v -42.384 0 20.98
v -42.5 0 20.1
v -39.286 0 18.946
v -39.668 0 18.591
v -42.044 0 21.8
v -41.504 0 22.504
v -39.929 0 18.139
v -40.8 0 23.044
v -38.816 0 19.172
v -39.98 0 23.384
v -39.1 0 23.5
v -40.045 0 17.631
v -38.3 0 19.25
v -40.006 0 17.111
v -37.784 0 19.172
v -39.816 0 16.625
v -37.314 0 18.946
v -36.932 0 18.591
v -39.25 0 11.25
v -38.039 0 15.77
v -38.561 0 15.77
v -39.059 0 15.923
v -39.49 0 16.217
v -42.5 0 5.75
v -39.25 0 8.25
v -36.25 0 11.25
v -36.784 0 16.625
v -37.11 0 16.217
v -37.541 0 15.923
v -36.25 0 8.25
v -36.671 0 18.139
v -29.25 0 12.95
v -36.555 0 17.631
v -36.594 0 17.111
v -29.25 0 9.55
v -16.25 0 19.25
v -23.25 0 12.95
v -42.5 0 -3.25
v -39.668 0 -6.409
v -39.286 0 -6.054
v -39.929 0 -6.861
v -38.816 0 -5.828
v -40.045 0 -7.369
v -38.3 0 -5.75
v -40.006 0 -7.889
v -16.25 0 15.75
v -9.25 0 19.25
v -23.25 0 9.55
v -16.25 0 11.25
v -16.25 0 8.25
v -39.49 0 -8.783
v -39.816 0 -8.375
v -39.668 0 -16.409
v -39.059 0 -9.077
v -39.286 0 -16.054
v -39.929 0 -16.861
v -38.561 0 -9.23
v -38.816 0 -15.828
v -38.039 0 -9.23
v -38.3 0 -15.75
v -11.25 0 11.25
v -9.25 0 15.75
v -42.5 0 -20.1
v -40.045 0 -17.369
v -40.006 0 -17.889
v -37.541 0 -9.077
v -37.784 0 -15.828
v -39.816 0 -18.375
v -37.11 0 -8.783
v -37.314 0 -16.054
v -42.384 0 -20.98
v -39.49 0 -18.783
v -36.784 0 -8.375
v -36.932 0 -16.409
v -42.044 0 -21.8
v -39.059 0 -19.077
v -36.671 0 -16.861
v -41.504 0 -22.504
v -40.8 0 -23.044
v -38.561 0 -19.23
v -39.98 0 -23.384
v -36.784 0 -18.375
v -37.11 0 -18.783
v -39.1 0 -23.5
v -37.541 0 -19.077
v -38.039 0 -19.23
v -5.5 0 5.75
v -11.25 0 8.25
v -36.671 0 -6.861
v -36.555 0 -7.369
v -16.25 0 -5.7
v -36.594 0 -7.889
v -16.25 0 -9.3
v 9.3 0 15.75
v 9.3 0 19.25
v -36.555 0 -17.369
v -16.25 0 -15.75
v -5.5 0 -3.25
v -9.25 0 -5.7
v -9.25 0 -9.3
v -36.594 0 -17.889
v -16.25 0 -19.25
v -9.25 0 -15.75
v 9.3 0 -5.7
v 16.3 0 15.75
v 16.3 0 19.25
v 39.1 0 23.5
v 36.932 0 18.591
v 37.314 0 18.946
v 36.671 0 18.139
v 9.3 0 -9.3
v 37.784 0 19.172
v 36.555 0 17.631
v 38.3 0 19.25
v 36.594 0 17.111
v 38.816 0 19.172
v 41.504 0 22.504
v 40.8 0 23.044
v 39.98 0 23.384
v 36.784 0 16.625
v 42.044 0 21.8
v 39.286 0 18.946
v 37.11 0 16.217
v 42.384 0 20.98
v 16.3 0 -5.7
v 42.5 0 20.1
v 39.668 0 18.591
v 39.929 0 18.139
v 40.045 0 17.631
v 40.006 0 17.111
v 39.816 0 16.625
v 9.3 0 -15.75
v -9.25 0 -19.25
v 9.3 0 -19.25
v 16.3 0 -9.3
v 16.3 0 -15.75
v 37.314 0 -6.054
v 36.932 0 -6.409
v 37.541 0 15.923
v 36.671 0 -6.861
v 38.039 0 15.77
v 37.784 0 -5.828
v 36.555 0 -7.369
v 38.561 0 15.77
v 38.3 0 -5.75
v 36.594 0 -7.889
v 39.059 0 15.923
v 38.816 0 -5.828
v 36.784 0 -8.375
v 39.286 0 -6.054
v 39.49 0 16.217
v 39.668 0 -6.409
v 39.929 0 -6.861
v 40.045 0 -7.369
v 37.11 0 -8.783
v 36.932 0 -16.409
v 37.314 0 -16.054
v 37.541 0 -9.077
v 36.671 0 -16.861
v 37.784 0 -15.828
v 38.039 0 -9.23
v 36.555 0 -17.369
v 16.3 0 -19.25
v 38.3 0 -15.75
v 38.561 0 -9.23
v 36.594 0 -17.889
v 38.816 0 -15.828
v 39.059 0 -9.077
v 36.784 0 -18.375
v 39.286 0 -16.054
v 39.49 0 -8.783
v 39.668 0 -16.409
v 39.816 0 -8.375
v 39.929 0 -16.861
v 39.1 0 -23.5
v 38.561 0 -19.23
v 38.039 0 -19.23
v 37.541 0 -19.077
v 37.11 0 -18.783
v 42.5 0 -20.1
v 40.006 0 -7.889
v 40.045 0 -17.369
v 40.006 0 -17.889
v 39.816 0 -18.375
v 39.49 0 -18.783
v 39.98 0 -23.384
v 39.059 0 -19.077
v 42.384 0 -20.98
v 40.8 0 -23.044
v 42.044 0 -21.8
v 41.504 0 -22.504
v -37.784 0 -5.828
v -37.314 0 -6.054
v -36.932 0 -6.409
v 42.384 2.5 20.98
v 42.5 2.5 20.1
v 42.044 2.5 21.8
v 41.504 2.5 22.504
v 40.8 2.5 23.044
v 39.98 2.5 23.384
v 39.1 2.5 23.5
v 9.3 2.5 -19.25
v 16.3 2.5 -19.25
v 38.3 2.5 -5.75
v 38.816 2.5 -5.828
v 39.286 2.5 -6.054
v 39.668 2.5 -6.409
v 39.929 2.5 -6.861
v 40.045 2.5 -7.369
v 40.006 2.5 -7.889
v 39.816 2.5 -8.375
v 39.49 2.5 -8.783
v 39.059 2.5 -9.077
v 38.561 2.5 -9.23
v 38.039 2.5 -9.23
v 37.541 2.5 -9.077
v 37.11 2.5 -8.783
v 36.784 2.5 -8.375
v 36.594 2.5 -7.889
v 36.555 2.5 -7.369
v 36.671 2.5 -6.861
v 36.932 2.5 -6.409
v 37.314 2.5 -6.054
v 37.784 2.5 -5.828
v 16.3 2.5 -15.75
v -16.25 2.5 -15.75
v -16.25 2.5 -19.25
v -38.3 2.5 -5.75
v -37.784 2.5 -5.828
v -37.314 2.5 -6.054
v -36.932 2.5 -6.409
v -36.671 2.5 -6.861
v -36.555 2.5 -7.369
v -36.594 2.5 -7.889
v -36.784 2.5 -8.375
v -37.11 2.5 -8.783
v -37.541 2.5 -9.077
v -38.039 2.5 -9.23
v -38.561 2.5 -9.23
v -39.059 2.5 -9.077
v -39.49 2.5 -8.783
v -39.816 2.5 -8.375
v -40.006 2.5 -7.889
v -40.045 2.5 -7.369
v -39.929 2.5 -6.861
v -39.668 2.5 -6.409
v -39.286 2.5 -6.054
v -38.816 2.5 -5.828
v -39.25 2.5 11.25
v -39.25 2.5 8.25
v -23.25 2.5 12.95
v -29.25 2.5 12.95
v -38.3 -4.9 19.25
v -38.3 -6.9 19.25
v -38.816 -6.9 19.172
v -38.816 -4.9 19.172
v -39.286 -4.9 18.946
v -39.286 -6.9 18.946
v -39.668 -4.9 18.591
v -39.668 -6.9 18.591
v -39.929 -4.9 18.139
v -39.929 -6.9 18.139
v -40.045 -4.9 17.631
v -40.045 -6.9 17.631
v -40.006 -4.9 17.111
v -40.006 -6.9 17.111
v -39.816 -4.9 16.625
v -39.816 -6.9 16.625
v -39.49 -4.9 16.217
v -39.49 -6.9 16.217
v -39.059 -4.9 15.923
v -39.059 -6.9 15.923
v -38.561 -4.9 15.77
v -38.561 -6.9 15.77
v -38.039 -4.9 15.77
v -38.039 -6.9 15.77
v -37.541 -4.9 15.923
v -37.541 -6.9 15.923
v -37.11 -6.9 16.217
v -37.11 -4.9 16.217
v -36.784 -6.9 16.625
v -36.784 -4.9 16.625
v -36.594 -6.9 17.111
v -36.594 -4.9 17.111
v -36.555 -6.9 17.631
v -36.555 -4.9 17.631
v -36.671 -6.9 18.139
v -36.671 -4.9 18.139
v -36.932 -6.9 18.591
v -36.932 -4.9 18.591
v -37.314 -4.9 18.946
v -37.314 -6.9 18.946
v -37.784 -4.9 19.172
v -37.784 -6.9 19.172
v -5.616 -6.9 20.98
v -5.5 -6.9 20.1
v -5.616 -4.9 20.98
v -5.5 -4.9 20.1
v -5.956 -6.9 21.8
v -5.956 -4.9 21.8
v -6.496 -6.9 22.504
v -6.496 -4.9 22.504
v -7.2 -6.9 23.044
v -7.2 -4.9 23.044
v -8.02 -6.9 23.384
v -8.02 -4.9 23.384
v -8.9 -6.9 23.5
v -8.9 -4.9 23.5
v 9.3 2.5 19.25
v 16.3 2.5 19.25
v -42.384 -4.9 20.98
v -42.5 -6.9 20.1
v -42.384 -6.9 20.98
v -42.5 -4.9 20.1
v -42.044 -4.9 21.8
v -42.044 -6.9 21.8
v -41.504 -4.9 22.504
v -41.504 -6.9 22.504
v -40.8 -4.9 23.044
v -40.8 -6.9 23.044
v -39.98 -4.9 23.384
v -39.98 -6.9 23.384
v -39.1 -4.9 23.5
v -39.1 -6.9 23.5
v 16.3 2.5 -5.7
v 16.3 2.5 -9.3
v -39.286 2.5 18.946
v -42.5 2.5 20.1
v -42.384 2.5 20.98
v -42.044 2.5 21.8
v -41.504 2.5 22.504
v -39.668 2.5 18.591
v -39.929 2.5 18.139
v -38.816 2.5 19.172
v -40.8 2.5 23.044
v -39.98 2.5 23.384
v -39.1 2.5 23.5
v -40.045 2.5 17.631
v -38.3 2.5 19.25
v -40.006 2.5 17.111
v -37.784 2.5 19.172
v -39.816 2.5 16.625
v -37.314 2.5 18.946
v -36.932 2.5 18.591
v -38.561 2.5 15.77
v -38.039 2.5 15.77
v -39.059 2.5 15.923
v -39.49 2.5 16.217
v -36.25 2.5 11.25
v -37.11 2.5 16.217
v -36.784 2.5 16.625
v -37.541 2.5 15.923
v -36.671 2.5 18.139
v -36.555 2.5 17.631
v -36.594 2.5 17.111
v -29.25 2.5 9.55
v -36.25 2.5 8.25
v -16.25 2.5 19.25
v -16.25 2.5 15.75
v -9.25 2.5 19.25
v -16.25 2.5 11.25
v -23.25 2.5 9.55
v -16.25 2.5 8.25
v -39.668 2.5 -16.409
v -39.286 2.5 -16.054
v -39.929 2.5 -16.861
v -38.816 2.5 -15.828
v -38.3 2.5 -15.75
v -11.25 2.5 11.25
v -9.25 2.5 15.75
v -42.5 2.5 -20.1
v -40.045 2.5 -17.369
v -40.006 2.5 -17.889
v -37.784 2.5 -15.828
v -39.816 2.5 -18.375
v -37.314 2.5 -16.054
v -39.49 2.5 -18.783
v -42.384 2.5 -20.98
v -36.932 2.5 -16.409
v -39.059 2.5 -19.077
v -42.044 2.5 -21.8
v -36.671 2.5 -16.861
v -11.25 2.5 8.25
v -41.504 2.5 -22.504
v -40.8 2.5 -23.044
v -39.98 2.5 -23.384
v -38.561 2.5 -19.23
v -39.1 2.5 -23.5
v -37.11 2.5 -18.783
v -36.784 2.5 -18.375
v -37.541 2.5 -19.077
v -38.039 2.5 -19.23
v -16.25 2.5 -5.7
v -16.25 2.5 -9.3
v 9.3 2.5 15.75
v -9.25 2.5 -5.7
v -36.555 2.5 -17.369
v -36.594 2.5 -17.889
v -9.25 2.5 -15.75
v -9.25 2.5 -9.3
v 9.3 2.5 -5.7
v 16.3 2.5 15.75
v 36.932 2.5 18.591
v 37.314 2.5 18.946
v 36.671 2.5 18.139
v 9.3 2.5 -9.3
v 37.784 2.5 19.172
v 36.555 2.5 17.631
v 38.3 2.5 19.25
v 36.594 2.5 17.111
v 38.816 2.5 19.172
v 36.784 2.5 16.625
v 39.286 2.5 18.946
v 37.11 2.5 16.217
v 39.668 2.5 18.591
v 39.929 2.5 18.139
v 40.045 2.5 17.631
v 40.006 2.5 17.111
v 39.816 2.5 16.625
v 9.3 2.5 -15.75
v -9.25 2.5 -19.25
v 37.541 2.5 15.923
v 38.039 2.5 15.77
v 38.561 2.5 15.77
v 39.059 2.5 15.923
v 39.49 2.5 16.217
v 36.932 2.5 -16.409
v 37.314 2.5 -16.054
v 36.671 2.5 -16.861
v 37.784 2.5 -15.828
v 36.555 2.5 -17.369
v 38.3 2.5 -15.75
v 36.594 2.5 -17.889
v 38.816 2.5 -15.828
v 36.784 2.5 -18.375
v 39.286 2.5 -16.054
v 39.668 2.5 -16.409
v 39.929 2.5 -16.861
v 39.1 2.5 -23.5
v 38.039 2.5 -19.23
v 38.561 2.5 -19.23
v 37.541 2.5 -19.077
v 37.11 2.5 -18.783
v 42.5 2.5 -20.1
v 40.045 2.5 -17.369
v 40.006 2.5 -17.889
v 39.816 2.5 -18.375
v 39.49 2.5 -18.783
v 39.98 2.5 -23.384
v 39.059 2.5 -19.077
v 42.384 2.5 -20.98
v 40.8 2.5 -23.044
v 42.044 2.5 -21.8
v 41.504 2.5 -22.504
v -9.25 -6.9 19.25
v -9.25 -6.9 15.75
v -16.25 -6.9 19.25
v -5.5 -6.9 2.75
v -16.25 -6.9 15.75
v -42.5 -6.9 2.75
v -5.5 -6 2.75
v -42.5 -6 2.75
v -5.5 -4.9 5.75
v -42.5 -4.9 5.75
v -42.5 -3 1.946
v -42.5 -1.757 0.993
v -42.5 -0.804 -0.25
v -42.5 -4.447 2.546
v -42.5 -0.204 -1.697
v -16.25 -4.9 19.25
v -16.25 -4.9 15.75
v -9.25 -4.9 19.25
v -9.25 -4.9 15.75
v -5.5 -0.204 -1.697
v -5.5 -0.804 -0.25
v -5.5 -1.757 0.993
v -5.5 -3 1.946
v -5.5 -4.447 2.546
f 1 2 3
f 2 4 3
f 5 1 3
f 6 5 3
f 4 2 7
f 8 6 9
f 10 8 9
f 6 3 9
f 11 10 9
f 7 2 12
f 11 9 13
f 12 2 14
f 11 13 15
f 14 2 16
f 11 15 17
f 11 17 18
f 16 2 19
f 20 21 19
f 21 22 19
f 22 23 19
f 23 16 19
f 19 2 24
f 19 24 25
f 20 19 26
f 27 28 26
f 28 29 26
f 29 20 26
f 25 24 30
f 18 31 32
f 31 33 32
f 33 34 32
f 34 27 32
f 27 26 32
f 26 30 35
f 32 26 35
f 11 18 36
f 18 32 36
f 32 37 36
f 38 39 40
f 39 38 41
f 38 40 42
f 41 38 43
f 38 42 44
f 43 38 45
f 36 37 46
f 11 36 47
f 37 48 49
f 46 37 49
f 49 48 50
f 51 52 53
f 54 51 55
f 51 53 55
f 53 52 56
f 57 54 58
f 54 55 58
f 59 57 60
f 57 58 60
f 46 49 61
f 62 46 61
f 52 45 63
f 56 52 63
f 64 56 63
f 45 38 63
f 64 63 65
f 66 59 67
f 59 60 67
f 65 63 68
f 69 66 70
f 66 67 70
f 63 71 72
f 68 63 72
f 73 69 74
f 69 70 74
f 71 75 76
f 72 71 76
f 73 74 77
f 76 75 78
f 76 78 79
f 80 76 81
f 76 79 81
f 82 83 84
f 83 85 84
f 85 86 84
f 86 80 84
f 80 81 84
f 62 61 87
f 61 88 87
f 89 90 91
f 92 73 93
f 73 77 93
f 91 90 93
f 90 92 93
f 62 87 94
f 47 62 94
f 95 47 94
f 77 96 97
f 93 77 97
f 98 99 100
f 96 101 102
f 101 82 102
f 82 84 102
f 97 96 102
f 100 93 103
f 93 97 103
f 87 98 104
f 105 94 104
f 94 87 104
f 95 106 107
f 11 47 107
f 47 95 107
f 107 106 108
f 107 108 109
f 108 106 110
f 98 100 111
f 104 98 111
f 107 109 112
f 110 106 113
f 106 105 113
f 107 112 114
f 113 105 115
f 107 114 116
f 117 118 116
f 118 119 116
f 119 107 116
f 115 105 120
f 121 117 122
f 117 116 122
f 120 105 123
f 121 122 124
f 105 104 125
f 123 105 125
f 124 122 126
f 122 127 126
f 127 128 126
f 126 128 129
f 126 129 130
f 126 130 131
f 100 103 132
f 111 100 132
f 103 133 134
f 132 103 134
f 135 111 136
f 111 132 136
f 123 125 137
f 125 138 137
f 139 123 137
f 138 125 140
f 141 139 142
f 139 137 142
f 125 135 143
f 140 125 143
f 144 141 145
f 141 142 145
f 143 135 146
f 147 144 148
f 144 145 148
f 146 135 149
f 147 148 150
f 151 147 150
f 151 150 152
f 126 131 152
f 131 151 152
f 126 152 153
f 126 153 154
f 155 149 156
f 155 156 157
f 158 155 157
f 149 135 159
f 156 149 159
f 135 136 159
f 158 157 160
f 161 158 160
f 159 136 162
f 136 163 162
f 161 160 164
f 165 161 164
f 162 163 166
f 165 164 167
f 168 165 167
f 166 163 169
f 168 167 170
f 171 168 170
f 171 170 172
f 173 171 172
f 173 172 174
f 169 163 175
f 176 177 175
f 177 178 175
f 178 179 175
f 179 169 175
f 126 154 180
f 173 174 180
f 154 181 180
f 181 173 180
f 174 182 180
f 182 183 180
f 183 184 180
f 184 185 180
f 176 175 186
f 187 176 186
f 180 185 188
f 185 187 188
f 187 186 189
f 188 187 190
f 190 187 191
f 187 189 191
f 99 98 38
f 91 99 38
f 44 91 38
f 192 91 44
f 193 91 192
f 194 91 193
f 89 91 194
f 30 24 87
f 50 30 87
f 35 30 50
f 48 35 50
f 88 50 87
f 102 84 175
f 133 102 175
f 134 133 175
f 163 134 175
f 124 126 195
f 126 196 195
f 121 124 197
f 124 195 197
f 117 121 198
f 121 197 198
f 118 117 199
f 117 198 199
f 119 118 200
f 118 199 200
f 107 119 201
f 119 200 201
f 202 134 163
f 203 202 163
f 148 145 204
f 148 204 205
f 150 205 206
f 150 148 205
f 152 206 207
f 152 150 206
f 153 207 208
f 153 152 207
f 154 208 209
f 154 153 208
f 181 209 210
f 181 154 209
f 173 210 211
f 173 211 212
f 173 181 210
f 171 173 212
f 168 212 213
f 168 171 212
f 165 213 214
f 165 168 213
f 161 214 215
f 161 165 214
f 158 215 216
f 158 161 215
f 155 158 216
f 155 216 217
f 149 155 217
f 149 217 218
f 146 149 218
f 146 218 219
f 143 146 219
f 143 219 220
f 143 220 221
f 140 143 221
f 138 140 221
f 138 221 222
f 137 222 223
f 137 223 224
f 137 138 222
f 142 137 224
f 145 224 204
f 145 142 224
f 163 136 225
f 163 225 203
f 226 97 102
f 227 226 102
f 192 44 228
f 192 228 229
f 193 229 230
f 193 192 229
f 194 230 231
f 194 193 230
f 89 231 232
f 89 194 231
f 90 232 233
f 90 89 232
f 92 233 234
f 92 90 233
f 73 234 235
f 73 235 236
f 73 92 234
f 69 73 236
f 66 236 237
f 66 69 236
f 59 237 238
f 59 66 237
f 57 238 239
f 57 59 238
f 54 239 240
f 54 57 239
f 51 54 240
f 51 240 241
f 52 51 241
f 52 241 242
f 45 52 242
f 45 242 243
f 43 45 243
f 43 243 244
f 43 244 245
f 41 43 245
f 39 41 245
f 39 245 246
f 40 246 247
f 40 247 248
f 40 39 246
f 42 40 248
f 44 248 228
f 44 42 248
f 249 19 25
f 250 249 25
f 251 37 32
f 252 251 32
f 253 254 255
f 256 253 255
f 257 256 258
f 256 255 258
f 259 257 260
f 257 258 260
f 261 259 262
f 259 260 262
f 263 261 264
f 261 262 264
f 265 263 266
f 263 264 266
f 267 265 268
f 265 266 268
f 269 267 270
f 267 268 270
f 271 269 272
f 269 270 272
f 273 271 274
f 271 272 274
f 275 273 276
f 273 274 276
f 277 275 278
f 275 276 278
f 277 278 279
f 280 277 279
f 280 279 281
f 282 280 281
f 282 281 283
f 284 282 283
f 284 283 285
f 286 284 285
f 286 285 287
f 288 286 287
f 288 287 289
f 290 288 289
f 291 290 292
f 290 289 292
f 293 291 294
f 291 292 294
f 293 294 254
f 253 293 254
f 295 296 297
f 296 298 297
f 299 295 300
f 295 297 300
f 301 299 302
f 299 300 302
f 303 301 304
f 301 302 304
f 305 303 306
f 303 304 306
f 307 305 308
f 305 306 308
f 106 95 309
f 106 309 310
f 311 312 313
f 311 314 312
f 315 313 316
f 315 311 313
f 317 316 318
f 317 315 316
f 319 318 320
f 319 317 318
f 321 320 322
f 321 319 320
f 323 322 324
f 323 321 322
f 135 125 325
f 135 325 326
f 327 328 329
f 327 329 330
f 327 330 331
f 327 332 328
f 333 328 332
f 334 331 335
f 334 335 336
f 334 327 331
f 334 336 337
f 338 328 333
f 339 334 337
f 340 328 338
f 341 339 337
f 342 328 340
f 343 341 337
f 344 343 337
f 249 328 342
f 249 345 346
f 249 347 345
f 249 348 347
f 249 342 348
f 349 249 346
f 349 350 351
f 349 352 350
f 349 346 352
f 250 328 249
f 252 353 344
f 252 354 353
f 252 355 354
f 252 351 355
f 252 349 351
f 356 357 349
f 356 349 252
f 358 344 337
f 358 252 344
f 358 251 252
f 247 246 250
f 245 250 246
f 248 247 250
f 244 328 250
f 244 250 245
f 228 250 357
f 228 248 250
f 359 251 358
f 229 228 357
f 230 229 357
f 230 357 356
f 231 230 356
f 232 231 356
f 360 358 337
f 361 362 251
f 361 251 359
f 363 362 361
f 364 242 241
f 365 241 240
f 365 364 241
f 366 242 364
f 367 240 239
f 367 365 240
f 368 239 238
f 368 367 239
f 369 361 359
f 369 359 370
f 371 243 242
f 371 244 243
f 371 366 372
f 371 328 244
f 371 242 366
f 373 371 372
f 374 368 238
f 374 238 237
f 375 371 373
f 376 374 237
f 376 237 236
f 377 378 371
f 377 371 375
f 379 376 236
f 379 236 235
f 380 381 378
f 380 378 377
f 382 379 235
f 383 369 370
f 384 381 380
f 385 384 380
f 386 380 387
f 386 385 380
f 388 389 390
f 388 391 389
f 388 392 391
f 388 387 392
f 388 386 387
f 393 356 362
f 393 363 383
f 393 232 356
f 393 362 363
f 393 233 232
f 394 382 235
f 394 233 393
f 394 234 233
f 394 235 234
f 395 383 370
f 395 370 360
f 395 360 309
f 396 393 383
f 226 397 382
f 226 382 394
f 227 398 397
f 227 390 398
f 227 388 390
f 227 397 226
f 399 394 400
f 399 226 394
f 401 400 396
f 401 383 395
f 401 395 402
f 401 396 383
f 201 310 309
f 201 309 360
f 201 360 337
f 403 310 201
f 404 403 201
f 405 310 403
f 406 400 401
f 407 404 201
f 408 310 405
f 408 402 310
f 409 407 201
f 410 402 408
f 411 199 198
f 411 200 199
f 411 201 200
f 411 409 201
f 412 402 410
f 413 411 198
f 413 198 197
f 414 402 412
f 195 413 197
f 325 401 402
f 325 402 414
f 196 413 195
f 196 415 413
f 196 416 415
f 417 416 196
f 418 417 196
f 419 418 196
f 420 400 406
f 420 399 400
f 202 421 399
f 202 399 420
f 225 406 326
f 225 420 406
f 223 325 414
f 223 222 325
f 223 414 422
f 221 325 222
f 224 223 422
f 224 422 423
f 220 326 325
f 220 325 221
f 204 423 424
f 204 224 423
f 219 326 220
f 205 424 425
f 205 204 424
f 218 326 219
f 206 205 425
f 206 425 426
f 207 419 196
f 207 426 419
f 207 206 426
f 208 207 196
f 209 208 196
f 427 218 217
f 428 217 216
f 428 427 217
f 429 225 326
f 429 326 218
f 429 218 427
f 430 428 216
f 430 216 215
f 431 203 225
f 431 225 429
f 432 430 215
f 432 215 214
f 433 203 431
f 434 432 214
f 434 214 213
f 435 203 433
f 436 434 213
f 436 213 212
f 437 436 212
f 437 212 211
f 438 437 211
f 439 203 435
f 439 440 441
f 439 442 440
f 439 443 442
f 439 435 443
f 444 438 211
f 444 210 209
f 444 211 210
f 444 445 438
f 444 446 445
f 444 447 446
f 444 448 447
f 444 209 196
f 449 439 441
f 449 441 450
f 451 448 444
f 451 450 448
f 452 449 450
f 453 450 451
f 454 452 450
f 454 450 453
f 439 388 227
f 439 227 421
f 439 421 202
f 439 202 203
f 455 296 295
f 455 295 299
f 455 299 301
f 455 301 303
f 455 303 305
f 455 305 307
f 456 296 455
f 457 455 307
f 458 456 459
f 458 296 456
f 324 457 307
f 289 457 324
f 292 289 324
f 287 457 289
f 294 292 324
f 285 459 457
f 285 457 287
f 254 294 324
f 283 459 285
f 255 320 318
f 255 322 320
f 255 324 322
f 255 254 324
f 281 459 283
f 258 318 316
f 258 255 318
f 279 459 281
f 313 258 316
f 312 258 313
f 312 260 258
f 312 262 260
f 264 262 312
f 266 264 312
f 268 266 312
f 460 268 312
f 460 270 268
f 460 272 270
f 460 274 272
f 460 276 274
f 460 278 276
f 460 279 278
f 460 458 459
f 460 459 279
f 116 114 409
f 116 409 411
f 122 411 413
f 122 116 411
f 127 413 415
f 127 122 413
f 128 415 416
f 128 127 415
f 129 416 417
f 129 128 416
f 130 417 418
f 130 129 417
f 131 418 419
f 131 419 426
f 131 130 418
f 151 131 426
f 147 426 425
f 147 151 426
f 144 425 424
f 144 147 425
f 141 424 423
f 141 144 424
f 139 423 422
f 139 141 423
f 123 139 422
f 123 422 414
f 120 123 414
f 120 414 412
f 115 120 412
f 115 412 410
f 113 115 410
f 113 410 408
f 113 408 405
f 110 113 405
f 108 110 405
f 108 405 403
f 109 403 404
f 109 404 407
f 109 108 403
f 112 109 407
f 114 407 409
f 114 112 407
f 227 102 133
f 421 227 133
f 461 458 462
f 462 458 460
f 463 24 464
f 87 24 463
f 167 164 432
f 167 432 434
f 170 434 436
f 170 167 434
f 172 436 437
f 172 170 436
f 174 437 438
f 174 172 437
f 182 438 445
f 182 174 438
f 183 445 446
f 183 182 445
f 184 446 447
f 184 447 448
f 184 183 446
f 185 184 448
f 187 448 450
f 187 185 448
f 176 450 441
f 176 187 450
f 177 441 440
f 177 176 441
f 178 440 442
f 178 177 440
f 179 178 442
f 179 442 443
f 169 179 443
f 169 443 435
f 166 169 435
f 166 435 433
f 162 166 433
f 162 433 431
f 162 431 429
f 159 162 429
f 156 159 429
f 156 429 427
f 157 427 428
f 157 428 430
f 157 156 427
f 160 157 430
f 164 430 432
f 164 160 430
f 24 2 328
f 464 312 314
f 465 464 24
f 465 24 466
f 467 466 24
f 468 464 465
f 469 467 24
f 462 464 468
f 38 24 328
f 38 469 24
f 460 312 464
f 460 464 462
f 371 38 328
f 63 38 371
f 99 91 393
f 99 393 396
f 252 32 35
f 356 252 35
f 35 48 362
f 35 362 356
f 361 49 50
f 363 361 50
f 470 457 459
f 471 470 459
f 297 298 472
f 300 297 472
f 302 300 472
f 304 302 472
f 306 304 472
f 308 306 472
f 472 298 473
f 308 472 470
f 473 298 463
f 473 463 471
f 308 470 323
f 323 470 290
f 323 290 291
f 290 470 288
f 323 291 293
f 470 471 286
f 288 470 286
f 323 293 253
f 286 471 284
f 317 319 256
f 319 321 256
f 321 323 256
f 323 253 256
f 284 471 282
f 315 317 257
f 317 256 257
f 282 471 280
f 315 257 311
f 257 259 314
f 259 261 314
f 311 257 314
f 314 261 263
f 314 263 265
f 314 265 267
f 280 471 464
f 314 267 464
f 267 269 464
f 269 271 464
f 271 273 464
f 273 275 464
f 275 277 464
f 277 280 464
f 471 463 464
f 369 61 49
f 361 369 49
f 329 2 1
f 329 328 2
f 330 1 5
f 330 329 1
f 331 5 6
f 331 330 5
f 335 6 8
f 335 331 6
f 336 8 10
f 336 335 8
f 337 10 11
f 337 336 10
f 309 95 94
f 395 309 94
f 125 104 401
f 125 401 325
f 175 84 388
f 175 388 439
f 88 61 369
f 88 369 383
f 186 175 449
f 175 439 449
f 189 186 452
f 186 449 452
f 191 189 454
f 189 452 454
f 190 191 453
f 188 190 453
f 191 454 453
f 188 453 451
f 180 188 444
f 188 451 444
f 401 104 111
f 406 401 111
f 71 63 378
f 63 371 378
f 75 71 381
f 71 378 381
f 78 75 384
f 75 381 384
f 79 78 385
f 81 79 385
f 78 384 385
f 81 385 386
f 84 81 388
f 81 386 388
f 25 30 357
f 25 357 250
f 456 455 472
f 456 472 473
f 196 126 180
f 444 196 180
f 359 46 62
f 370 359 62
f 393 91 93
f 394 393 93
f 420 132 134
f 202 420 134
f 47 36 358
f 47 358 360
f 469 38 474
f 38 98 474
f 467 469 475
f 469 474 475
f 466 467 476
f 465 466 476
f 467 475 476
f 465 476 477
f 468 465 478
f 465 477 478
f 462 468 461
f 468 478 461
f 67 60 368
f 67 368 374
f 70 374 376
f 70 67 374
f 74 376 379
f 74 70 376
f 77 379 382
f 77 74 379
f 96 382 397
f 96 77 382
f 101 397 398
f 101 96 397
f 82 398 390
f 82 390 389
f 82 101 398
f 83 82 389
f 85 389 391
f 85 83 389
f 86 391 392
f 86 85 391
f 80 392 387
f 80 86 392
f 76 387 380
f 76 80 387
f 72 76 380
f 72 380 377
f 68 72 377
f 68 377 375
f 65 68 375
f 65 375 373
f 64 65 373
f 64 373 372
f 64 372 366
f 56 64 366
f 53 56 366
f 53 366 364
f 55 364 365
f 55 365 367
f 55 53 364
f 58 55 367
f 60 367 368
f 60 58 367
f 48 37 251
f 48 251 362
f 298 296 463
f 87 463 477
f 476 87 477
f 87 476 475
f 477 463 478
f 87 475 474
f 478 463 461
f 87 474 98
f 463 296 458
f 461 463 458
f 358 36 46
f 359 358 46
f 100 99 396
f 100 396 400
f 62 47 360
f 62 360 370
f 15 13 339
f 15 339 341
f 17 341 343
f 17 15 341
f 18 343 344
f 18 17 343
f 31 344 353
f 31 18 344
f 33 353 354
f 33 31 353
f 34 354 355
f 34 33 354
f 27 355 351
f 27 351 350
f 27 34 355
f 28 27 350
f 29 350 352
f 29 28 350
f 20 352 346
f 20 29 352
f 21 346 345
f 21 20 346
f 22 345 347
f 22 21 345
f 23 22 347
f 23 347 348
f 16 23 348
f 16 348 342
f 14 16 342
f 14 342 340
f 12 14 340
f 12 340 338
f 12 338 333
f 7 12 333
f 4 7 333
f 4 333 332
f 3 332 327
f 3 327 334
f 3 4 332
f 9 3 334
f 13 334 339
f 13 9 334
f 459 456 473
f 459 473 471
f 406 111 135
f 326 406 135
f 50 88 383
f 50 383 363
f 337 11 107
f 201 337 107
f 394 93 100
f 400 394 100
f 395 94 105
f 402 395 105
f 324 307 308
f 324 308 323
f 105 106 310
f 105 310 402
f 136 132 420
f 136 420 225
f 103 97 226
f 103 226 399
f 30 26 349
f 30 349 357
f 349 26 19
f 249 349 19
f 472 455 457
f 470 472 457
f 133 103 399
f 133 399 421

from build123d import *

# Parameters (mm, degrees)
SKETCH_1_W          = 85
SKETCH_1_H          = 47
SKETCH_1_R          = 1.75
SKETCH_1_W_2        = 7
SKETCH_1_H_2        = 3.5
SKETCH_1_H_3        = 3.6
EXTRUDE_1_DEPTH     = 2.5
SKETCH_2_W          = 37
SKETCH_2_H          = 3
EXTRUDE_2_DEPTH     = 4.9
EXTRUDE_START       = 2
SKETCH_3_W          = 37
SKETCH_3_H          = 20.75
SKETCH_3_R          = 1.75
SKETCH_3_W_2        = 7
SKETCH_3_H_2        = 3.5
EXTRUDE_4_DEPTH     = 2
FILLET_1_R          = 3.4
SKETCH_4_W          = 6
SKETCH_4_H          = 3.4
SKETCH_4_W_2        = 5
SKETCH_4_H_2        = 3
SKETCH_4_W_3        = 3
CUT_EXTRUDE_1_DEPTH = 7.4
FILLET_2_R          = 6


with BuildPart() as part:
    # 草图1 → 凸台-拉伸1 (new body)
    with BuildSketch(Plane(origin=(0, 0, 0), x_dir=(1, 0, 0), z_dir=(0, 1, 0))):
        Rectangle(SKETCH_1_W, SKETCH_1_H)
        with Locations(Location((-38.3, -17.5, 0), (0, 0, 270))):
            Circle(SKETCH_1_R, mode=Mode.SUBTRACT)
        with Locations(Location((38.3, -17.5, 0), (0, 0, 270))):
            Circle(SKETCH_1_R, mode=Mode.SUBTRACT)
        with Locations(Location((-38.3, 7.5, 0), (0, 0, 270))):
            Circle(SKETCH_1_R, mode=Mode.SUBTRACT)
        with Locations(Location((38.3, 7.5, 0), (0, 0, 270))):
            Circle(SKETCH_1_R, mode=Mode.SUBTRACT)
        with Locations(Location((-38.3, 17.5, 0), (0, 0, 270))):
            Circle(SKETCH_1_R, mode=Mode.SUBTRACT)
        with Locations(Location((38.3, 17.5, 0), (0, 0, 270))):
            Circle(SKETCH_1_R, mode=Mode.SUBTRACT)
        with Locations((-12.75, -17.5)):
            Rectangle(SKETCH_1_W_2, SKETCH_1_H_2, mode=Mode.SUBTRACT)
        with Locations((12.8, -17.5)):
            Rectangle(SKETCH_1_W_2, SKETCH_1_H_2, mode=Mode.SUBTRACT)
        with Locations((-12.75, 7.5)):
            Rectangle(SKETCH_1_W_2, SKETCH_1_H_3, mode=Mode.SUBTRACT)
        with Locations((12.8, 7.5)):
            Rectangle(SKETCH_1_W_2, SKETCH_1_H_3, mode=Mode.SUBTRACT)
        with Locations((-12.75, 17.5)):
            Rectangle(SKETCH_1_W_2, SKETCH_1_H_2, mode=Mode.SUBTRACT)
        with Locations((12.8, 17.5)):
            Rectangle(SKETCH_1_W_2, SKETCH_1_H_2, mode=Mode.SUBTRACT)
    extrude(amount=EXTRUDE_1_DEPTH)

    # 草图2 → 凸台-拉伸2 (add)
    with BuildSketch(Plane(origin=(0, 0, 0), x_dir=(1, 0, 0), z_dir=(0, 1, 0))):
        with Locations((-24, -4.25)):
            Rectangle(SKETCH_2_W, SKETCH_2_H)
    extrude(amount=-EXTRUDE_2_DEPTH)

    # 草图3 → 凸台-拉伸4 (add)
    with BuildSketch(Plane(origin=(0, -4.9, 0), x_dir=(-1, 0, 0), z_dir=(0, -1, 0)).offset(EXTRUDE_START)):
        with Locations((24, -13.125)):
            Rectangle(SKETCH_3_W, SKETCH_3_H)
        with Locations(Location((38.3, -17.5, 0), (0, 0, 270))):
            Circle(SKETCH_3_R, mode=Mode.SUBTRACT)
        with Locations((12.75, -17.5)):
            Rectangle(SKETCH_3_W_2, SKETCH_3_H_2, mode=Mode.SUBTRACT)
    extrude(amount=-EXTRUDE_4_DEPTH)

    # 圆角1
    fillet_1_edges = [part.edges().sort_by_distance(p)[0] for p in [
        (-5.5, -5.9, 23.5),
        (-42.5, -5.9, 23.5),
        (42.5, 1.25, 23.5),
        (-42.5, 1.25, 23.5),
        (-42.5, 1.25, -23.5),
        (42.5, 1.25, -23.5),
    ]]
    fillet(fillet_1_edges, radius=FILLET_1_R)

    # 草图4 → 切除-拉伸1 (cut)
    with BuildSketch(Plane(origin=(0, -4.9, 0), x_dir=(-1, 0, 0), z_dir=(0, -1, 0))):
        with Locations((26.25, -11.25)):
            Rectangle(SKETCH_4_W, SKETCH_4_H)
        with Locations((13.75, -9.75)):
            Rectangle(SKETCH_4_W_2, SKETCH_4_H_2)
        with Locations((37.75, -9.75)):
            Rectangle(SKETCH_4_W_3, SKETCH_4_H_2)
    extrude(amount=-CUT_EXTRUDE_1_DEPTH, mode=Mode.SUBTRACT)

    # 圆角2
    fillet_2_edges = [part.edges().sort_by_distance(p)[0] for p in [
        (-24, 0, 2.75),
    ]]
    fillet(fillet_2_edges, radius=FILLET_2_R)


solid = part.part
